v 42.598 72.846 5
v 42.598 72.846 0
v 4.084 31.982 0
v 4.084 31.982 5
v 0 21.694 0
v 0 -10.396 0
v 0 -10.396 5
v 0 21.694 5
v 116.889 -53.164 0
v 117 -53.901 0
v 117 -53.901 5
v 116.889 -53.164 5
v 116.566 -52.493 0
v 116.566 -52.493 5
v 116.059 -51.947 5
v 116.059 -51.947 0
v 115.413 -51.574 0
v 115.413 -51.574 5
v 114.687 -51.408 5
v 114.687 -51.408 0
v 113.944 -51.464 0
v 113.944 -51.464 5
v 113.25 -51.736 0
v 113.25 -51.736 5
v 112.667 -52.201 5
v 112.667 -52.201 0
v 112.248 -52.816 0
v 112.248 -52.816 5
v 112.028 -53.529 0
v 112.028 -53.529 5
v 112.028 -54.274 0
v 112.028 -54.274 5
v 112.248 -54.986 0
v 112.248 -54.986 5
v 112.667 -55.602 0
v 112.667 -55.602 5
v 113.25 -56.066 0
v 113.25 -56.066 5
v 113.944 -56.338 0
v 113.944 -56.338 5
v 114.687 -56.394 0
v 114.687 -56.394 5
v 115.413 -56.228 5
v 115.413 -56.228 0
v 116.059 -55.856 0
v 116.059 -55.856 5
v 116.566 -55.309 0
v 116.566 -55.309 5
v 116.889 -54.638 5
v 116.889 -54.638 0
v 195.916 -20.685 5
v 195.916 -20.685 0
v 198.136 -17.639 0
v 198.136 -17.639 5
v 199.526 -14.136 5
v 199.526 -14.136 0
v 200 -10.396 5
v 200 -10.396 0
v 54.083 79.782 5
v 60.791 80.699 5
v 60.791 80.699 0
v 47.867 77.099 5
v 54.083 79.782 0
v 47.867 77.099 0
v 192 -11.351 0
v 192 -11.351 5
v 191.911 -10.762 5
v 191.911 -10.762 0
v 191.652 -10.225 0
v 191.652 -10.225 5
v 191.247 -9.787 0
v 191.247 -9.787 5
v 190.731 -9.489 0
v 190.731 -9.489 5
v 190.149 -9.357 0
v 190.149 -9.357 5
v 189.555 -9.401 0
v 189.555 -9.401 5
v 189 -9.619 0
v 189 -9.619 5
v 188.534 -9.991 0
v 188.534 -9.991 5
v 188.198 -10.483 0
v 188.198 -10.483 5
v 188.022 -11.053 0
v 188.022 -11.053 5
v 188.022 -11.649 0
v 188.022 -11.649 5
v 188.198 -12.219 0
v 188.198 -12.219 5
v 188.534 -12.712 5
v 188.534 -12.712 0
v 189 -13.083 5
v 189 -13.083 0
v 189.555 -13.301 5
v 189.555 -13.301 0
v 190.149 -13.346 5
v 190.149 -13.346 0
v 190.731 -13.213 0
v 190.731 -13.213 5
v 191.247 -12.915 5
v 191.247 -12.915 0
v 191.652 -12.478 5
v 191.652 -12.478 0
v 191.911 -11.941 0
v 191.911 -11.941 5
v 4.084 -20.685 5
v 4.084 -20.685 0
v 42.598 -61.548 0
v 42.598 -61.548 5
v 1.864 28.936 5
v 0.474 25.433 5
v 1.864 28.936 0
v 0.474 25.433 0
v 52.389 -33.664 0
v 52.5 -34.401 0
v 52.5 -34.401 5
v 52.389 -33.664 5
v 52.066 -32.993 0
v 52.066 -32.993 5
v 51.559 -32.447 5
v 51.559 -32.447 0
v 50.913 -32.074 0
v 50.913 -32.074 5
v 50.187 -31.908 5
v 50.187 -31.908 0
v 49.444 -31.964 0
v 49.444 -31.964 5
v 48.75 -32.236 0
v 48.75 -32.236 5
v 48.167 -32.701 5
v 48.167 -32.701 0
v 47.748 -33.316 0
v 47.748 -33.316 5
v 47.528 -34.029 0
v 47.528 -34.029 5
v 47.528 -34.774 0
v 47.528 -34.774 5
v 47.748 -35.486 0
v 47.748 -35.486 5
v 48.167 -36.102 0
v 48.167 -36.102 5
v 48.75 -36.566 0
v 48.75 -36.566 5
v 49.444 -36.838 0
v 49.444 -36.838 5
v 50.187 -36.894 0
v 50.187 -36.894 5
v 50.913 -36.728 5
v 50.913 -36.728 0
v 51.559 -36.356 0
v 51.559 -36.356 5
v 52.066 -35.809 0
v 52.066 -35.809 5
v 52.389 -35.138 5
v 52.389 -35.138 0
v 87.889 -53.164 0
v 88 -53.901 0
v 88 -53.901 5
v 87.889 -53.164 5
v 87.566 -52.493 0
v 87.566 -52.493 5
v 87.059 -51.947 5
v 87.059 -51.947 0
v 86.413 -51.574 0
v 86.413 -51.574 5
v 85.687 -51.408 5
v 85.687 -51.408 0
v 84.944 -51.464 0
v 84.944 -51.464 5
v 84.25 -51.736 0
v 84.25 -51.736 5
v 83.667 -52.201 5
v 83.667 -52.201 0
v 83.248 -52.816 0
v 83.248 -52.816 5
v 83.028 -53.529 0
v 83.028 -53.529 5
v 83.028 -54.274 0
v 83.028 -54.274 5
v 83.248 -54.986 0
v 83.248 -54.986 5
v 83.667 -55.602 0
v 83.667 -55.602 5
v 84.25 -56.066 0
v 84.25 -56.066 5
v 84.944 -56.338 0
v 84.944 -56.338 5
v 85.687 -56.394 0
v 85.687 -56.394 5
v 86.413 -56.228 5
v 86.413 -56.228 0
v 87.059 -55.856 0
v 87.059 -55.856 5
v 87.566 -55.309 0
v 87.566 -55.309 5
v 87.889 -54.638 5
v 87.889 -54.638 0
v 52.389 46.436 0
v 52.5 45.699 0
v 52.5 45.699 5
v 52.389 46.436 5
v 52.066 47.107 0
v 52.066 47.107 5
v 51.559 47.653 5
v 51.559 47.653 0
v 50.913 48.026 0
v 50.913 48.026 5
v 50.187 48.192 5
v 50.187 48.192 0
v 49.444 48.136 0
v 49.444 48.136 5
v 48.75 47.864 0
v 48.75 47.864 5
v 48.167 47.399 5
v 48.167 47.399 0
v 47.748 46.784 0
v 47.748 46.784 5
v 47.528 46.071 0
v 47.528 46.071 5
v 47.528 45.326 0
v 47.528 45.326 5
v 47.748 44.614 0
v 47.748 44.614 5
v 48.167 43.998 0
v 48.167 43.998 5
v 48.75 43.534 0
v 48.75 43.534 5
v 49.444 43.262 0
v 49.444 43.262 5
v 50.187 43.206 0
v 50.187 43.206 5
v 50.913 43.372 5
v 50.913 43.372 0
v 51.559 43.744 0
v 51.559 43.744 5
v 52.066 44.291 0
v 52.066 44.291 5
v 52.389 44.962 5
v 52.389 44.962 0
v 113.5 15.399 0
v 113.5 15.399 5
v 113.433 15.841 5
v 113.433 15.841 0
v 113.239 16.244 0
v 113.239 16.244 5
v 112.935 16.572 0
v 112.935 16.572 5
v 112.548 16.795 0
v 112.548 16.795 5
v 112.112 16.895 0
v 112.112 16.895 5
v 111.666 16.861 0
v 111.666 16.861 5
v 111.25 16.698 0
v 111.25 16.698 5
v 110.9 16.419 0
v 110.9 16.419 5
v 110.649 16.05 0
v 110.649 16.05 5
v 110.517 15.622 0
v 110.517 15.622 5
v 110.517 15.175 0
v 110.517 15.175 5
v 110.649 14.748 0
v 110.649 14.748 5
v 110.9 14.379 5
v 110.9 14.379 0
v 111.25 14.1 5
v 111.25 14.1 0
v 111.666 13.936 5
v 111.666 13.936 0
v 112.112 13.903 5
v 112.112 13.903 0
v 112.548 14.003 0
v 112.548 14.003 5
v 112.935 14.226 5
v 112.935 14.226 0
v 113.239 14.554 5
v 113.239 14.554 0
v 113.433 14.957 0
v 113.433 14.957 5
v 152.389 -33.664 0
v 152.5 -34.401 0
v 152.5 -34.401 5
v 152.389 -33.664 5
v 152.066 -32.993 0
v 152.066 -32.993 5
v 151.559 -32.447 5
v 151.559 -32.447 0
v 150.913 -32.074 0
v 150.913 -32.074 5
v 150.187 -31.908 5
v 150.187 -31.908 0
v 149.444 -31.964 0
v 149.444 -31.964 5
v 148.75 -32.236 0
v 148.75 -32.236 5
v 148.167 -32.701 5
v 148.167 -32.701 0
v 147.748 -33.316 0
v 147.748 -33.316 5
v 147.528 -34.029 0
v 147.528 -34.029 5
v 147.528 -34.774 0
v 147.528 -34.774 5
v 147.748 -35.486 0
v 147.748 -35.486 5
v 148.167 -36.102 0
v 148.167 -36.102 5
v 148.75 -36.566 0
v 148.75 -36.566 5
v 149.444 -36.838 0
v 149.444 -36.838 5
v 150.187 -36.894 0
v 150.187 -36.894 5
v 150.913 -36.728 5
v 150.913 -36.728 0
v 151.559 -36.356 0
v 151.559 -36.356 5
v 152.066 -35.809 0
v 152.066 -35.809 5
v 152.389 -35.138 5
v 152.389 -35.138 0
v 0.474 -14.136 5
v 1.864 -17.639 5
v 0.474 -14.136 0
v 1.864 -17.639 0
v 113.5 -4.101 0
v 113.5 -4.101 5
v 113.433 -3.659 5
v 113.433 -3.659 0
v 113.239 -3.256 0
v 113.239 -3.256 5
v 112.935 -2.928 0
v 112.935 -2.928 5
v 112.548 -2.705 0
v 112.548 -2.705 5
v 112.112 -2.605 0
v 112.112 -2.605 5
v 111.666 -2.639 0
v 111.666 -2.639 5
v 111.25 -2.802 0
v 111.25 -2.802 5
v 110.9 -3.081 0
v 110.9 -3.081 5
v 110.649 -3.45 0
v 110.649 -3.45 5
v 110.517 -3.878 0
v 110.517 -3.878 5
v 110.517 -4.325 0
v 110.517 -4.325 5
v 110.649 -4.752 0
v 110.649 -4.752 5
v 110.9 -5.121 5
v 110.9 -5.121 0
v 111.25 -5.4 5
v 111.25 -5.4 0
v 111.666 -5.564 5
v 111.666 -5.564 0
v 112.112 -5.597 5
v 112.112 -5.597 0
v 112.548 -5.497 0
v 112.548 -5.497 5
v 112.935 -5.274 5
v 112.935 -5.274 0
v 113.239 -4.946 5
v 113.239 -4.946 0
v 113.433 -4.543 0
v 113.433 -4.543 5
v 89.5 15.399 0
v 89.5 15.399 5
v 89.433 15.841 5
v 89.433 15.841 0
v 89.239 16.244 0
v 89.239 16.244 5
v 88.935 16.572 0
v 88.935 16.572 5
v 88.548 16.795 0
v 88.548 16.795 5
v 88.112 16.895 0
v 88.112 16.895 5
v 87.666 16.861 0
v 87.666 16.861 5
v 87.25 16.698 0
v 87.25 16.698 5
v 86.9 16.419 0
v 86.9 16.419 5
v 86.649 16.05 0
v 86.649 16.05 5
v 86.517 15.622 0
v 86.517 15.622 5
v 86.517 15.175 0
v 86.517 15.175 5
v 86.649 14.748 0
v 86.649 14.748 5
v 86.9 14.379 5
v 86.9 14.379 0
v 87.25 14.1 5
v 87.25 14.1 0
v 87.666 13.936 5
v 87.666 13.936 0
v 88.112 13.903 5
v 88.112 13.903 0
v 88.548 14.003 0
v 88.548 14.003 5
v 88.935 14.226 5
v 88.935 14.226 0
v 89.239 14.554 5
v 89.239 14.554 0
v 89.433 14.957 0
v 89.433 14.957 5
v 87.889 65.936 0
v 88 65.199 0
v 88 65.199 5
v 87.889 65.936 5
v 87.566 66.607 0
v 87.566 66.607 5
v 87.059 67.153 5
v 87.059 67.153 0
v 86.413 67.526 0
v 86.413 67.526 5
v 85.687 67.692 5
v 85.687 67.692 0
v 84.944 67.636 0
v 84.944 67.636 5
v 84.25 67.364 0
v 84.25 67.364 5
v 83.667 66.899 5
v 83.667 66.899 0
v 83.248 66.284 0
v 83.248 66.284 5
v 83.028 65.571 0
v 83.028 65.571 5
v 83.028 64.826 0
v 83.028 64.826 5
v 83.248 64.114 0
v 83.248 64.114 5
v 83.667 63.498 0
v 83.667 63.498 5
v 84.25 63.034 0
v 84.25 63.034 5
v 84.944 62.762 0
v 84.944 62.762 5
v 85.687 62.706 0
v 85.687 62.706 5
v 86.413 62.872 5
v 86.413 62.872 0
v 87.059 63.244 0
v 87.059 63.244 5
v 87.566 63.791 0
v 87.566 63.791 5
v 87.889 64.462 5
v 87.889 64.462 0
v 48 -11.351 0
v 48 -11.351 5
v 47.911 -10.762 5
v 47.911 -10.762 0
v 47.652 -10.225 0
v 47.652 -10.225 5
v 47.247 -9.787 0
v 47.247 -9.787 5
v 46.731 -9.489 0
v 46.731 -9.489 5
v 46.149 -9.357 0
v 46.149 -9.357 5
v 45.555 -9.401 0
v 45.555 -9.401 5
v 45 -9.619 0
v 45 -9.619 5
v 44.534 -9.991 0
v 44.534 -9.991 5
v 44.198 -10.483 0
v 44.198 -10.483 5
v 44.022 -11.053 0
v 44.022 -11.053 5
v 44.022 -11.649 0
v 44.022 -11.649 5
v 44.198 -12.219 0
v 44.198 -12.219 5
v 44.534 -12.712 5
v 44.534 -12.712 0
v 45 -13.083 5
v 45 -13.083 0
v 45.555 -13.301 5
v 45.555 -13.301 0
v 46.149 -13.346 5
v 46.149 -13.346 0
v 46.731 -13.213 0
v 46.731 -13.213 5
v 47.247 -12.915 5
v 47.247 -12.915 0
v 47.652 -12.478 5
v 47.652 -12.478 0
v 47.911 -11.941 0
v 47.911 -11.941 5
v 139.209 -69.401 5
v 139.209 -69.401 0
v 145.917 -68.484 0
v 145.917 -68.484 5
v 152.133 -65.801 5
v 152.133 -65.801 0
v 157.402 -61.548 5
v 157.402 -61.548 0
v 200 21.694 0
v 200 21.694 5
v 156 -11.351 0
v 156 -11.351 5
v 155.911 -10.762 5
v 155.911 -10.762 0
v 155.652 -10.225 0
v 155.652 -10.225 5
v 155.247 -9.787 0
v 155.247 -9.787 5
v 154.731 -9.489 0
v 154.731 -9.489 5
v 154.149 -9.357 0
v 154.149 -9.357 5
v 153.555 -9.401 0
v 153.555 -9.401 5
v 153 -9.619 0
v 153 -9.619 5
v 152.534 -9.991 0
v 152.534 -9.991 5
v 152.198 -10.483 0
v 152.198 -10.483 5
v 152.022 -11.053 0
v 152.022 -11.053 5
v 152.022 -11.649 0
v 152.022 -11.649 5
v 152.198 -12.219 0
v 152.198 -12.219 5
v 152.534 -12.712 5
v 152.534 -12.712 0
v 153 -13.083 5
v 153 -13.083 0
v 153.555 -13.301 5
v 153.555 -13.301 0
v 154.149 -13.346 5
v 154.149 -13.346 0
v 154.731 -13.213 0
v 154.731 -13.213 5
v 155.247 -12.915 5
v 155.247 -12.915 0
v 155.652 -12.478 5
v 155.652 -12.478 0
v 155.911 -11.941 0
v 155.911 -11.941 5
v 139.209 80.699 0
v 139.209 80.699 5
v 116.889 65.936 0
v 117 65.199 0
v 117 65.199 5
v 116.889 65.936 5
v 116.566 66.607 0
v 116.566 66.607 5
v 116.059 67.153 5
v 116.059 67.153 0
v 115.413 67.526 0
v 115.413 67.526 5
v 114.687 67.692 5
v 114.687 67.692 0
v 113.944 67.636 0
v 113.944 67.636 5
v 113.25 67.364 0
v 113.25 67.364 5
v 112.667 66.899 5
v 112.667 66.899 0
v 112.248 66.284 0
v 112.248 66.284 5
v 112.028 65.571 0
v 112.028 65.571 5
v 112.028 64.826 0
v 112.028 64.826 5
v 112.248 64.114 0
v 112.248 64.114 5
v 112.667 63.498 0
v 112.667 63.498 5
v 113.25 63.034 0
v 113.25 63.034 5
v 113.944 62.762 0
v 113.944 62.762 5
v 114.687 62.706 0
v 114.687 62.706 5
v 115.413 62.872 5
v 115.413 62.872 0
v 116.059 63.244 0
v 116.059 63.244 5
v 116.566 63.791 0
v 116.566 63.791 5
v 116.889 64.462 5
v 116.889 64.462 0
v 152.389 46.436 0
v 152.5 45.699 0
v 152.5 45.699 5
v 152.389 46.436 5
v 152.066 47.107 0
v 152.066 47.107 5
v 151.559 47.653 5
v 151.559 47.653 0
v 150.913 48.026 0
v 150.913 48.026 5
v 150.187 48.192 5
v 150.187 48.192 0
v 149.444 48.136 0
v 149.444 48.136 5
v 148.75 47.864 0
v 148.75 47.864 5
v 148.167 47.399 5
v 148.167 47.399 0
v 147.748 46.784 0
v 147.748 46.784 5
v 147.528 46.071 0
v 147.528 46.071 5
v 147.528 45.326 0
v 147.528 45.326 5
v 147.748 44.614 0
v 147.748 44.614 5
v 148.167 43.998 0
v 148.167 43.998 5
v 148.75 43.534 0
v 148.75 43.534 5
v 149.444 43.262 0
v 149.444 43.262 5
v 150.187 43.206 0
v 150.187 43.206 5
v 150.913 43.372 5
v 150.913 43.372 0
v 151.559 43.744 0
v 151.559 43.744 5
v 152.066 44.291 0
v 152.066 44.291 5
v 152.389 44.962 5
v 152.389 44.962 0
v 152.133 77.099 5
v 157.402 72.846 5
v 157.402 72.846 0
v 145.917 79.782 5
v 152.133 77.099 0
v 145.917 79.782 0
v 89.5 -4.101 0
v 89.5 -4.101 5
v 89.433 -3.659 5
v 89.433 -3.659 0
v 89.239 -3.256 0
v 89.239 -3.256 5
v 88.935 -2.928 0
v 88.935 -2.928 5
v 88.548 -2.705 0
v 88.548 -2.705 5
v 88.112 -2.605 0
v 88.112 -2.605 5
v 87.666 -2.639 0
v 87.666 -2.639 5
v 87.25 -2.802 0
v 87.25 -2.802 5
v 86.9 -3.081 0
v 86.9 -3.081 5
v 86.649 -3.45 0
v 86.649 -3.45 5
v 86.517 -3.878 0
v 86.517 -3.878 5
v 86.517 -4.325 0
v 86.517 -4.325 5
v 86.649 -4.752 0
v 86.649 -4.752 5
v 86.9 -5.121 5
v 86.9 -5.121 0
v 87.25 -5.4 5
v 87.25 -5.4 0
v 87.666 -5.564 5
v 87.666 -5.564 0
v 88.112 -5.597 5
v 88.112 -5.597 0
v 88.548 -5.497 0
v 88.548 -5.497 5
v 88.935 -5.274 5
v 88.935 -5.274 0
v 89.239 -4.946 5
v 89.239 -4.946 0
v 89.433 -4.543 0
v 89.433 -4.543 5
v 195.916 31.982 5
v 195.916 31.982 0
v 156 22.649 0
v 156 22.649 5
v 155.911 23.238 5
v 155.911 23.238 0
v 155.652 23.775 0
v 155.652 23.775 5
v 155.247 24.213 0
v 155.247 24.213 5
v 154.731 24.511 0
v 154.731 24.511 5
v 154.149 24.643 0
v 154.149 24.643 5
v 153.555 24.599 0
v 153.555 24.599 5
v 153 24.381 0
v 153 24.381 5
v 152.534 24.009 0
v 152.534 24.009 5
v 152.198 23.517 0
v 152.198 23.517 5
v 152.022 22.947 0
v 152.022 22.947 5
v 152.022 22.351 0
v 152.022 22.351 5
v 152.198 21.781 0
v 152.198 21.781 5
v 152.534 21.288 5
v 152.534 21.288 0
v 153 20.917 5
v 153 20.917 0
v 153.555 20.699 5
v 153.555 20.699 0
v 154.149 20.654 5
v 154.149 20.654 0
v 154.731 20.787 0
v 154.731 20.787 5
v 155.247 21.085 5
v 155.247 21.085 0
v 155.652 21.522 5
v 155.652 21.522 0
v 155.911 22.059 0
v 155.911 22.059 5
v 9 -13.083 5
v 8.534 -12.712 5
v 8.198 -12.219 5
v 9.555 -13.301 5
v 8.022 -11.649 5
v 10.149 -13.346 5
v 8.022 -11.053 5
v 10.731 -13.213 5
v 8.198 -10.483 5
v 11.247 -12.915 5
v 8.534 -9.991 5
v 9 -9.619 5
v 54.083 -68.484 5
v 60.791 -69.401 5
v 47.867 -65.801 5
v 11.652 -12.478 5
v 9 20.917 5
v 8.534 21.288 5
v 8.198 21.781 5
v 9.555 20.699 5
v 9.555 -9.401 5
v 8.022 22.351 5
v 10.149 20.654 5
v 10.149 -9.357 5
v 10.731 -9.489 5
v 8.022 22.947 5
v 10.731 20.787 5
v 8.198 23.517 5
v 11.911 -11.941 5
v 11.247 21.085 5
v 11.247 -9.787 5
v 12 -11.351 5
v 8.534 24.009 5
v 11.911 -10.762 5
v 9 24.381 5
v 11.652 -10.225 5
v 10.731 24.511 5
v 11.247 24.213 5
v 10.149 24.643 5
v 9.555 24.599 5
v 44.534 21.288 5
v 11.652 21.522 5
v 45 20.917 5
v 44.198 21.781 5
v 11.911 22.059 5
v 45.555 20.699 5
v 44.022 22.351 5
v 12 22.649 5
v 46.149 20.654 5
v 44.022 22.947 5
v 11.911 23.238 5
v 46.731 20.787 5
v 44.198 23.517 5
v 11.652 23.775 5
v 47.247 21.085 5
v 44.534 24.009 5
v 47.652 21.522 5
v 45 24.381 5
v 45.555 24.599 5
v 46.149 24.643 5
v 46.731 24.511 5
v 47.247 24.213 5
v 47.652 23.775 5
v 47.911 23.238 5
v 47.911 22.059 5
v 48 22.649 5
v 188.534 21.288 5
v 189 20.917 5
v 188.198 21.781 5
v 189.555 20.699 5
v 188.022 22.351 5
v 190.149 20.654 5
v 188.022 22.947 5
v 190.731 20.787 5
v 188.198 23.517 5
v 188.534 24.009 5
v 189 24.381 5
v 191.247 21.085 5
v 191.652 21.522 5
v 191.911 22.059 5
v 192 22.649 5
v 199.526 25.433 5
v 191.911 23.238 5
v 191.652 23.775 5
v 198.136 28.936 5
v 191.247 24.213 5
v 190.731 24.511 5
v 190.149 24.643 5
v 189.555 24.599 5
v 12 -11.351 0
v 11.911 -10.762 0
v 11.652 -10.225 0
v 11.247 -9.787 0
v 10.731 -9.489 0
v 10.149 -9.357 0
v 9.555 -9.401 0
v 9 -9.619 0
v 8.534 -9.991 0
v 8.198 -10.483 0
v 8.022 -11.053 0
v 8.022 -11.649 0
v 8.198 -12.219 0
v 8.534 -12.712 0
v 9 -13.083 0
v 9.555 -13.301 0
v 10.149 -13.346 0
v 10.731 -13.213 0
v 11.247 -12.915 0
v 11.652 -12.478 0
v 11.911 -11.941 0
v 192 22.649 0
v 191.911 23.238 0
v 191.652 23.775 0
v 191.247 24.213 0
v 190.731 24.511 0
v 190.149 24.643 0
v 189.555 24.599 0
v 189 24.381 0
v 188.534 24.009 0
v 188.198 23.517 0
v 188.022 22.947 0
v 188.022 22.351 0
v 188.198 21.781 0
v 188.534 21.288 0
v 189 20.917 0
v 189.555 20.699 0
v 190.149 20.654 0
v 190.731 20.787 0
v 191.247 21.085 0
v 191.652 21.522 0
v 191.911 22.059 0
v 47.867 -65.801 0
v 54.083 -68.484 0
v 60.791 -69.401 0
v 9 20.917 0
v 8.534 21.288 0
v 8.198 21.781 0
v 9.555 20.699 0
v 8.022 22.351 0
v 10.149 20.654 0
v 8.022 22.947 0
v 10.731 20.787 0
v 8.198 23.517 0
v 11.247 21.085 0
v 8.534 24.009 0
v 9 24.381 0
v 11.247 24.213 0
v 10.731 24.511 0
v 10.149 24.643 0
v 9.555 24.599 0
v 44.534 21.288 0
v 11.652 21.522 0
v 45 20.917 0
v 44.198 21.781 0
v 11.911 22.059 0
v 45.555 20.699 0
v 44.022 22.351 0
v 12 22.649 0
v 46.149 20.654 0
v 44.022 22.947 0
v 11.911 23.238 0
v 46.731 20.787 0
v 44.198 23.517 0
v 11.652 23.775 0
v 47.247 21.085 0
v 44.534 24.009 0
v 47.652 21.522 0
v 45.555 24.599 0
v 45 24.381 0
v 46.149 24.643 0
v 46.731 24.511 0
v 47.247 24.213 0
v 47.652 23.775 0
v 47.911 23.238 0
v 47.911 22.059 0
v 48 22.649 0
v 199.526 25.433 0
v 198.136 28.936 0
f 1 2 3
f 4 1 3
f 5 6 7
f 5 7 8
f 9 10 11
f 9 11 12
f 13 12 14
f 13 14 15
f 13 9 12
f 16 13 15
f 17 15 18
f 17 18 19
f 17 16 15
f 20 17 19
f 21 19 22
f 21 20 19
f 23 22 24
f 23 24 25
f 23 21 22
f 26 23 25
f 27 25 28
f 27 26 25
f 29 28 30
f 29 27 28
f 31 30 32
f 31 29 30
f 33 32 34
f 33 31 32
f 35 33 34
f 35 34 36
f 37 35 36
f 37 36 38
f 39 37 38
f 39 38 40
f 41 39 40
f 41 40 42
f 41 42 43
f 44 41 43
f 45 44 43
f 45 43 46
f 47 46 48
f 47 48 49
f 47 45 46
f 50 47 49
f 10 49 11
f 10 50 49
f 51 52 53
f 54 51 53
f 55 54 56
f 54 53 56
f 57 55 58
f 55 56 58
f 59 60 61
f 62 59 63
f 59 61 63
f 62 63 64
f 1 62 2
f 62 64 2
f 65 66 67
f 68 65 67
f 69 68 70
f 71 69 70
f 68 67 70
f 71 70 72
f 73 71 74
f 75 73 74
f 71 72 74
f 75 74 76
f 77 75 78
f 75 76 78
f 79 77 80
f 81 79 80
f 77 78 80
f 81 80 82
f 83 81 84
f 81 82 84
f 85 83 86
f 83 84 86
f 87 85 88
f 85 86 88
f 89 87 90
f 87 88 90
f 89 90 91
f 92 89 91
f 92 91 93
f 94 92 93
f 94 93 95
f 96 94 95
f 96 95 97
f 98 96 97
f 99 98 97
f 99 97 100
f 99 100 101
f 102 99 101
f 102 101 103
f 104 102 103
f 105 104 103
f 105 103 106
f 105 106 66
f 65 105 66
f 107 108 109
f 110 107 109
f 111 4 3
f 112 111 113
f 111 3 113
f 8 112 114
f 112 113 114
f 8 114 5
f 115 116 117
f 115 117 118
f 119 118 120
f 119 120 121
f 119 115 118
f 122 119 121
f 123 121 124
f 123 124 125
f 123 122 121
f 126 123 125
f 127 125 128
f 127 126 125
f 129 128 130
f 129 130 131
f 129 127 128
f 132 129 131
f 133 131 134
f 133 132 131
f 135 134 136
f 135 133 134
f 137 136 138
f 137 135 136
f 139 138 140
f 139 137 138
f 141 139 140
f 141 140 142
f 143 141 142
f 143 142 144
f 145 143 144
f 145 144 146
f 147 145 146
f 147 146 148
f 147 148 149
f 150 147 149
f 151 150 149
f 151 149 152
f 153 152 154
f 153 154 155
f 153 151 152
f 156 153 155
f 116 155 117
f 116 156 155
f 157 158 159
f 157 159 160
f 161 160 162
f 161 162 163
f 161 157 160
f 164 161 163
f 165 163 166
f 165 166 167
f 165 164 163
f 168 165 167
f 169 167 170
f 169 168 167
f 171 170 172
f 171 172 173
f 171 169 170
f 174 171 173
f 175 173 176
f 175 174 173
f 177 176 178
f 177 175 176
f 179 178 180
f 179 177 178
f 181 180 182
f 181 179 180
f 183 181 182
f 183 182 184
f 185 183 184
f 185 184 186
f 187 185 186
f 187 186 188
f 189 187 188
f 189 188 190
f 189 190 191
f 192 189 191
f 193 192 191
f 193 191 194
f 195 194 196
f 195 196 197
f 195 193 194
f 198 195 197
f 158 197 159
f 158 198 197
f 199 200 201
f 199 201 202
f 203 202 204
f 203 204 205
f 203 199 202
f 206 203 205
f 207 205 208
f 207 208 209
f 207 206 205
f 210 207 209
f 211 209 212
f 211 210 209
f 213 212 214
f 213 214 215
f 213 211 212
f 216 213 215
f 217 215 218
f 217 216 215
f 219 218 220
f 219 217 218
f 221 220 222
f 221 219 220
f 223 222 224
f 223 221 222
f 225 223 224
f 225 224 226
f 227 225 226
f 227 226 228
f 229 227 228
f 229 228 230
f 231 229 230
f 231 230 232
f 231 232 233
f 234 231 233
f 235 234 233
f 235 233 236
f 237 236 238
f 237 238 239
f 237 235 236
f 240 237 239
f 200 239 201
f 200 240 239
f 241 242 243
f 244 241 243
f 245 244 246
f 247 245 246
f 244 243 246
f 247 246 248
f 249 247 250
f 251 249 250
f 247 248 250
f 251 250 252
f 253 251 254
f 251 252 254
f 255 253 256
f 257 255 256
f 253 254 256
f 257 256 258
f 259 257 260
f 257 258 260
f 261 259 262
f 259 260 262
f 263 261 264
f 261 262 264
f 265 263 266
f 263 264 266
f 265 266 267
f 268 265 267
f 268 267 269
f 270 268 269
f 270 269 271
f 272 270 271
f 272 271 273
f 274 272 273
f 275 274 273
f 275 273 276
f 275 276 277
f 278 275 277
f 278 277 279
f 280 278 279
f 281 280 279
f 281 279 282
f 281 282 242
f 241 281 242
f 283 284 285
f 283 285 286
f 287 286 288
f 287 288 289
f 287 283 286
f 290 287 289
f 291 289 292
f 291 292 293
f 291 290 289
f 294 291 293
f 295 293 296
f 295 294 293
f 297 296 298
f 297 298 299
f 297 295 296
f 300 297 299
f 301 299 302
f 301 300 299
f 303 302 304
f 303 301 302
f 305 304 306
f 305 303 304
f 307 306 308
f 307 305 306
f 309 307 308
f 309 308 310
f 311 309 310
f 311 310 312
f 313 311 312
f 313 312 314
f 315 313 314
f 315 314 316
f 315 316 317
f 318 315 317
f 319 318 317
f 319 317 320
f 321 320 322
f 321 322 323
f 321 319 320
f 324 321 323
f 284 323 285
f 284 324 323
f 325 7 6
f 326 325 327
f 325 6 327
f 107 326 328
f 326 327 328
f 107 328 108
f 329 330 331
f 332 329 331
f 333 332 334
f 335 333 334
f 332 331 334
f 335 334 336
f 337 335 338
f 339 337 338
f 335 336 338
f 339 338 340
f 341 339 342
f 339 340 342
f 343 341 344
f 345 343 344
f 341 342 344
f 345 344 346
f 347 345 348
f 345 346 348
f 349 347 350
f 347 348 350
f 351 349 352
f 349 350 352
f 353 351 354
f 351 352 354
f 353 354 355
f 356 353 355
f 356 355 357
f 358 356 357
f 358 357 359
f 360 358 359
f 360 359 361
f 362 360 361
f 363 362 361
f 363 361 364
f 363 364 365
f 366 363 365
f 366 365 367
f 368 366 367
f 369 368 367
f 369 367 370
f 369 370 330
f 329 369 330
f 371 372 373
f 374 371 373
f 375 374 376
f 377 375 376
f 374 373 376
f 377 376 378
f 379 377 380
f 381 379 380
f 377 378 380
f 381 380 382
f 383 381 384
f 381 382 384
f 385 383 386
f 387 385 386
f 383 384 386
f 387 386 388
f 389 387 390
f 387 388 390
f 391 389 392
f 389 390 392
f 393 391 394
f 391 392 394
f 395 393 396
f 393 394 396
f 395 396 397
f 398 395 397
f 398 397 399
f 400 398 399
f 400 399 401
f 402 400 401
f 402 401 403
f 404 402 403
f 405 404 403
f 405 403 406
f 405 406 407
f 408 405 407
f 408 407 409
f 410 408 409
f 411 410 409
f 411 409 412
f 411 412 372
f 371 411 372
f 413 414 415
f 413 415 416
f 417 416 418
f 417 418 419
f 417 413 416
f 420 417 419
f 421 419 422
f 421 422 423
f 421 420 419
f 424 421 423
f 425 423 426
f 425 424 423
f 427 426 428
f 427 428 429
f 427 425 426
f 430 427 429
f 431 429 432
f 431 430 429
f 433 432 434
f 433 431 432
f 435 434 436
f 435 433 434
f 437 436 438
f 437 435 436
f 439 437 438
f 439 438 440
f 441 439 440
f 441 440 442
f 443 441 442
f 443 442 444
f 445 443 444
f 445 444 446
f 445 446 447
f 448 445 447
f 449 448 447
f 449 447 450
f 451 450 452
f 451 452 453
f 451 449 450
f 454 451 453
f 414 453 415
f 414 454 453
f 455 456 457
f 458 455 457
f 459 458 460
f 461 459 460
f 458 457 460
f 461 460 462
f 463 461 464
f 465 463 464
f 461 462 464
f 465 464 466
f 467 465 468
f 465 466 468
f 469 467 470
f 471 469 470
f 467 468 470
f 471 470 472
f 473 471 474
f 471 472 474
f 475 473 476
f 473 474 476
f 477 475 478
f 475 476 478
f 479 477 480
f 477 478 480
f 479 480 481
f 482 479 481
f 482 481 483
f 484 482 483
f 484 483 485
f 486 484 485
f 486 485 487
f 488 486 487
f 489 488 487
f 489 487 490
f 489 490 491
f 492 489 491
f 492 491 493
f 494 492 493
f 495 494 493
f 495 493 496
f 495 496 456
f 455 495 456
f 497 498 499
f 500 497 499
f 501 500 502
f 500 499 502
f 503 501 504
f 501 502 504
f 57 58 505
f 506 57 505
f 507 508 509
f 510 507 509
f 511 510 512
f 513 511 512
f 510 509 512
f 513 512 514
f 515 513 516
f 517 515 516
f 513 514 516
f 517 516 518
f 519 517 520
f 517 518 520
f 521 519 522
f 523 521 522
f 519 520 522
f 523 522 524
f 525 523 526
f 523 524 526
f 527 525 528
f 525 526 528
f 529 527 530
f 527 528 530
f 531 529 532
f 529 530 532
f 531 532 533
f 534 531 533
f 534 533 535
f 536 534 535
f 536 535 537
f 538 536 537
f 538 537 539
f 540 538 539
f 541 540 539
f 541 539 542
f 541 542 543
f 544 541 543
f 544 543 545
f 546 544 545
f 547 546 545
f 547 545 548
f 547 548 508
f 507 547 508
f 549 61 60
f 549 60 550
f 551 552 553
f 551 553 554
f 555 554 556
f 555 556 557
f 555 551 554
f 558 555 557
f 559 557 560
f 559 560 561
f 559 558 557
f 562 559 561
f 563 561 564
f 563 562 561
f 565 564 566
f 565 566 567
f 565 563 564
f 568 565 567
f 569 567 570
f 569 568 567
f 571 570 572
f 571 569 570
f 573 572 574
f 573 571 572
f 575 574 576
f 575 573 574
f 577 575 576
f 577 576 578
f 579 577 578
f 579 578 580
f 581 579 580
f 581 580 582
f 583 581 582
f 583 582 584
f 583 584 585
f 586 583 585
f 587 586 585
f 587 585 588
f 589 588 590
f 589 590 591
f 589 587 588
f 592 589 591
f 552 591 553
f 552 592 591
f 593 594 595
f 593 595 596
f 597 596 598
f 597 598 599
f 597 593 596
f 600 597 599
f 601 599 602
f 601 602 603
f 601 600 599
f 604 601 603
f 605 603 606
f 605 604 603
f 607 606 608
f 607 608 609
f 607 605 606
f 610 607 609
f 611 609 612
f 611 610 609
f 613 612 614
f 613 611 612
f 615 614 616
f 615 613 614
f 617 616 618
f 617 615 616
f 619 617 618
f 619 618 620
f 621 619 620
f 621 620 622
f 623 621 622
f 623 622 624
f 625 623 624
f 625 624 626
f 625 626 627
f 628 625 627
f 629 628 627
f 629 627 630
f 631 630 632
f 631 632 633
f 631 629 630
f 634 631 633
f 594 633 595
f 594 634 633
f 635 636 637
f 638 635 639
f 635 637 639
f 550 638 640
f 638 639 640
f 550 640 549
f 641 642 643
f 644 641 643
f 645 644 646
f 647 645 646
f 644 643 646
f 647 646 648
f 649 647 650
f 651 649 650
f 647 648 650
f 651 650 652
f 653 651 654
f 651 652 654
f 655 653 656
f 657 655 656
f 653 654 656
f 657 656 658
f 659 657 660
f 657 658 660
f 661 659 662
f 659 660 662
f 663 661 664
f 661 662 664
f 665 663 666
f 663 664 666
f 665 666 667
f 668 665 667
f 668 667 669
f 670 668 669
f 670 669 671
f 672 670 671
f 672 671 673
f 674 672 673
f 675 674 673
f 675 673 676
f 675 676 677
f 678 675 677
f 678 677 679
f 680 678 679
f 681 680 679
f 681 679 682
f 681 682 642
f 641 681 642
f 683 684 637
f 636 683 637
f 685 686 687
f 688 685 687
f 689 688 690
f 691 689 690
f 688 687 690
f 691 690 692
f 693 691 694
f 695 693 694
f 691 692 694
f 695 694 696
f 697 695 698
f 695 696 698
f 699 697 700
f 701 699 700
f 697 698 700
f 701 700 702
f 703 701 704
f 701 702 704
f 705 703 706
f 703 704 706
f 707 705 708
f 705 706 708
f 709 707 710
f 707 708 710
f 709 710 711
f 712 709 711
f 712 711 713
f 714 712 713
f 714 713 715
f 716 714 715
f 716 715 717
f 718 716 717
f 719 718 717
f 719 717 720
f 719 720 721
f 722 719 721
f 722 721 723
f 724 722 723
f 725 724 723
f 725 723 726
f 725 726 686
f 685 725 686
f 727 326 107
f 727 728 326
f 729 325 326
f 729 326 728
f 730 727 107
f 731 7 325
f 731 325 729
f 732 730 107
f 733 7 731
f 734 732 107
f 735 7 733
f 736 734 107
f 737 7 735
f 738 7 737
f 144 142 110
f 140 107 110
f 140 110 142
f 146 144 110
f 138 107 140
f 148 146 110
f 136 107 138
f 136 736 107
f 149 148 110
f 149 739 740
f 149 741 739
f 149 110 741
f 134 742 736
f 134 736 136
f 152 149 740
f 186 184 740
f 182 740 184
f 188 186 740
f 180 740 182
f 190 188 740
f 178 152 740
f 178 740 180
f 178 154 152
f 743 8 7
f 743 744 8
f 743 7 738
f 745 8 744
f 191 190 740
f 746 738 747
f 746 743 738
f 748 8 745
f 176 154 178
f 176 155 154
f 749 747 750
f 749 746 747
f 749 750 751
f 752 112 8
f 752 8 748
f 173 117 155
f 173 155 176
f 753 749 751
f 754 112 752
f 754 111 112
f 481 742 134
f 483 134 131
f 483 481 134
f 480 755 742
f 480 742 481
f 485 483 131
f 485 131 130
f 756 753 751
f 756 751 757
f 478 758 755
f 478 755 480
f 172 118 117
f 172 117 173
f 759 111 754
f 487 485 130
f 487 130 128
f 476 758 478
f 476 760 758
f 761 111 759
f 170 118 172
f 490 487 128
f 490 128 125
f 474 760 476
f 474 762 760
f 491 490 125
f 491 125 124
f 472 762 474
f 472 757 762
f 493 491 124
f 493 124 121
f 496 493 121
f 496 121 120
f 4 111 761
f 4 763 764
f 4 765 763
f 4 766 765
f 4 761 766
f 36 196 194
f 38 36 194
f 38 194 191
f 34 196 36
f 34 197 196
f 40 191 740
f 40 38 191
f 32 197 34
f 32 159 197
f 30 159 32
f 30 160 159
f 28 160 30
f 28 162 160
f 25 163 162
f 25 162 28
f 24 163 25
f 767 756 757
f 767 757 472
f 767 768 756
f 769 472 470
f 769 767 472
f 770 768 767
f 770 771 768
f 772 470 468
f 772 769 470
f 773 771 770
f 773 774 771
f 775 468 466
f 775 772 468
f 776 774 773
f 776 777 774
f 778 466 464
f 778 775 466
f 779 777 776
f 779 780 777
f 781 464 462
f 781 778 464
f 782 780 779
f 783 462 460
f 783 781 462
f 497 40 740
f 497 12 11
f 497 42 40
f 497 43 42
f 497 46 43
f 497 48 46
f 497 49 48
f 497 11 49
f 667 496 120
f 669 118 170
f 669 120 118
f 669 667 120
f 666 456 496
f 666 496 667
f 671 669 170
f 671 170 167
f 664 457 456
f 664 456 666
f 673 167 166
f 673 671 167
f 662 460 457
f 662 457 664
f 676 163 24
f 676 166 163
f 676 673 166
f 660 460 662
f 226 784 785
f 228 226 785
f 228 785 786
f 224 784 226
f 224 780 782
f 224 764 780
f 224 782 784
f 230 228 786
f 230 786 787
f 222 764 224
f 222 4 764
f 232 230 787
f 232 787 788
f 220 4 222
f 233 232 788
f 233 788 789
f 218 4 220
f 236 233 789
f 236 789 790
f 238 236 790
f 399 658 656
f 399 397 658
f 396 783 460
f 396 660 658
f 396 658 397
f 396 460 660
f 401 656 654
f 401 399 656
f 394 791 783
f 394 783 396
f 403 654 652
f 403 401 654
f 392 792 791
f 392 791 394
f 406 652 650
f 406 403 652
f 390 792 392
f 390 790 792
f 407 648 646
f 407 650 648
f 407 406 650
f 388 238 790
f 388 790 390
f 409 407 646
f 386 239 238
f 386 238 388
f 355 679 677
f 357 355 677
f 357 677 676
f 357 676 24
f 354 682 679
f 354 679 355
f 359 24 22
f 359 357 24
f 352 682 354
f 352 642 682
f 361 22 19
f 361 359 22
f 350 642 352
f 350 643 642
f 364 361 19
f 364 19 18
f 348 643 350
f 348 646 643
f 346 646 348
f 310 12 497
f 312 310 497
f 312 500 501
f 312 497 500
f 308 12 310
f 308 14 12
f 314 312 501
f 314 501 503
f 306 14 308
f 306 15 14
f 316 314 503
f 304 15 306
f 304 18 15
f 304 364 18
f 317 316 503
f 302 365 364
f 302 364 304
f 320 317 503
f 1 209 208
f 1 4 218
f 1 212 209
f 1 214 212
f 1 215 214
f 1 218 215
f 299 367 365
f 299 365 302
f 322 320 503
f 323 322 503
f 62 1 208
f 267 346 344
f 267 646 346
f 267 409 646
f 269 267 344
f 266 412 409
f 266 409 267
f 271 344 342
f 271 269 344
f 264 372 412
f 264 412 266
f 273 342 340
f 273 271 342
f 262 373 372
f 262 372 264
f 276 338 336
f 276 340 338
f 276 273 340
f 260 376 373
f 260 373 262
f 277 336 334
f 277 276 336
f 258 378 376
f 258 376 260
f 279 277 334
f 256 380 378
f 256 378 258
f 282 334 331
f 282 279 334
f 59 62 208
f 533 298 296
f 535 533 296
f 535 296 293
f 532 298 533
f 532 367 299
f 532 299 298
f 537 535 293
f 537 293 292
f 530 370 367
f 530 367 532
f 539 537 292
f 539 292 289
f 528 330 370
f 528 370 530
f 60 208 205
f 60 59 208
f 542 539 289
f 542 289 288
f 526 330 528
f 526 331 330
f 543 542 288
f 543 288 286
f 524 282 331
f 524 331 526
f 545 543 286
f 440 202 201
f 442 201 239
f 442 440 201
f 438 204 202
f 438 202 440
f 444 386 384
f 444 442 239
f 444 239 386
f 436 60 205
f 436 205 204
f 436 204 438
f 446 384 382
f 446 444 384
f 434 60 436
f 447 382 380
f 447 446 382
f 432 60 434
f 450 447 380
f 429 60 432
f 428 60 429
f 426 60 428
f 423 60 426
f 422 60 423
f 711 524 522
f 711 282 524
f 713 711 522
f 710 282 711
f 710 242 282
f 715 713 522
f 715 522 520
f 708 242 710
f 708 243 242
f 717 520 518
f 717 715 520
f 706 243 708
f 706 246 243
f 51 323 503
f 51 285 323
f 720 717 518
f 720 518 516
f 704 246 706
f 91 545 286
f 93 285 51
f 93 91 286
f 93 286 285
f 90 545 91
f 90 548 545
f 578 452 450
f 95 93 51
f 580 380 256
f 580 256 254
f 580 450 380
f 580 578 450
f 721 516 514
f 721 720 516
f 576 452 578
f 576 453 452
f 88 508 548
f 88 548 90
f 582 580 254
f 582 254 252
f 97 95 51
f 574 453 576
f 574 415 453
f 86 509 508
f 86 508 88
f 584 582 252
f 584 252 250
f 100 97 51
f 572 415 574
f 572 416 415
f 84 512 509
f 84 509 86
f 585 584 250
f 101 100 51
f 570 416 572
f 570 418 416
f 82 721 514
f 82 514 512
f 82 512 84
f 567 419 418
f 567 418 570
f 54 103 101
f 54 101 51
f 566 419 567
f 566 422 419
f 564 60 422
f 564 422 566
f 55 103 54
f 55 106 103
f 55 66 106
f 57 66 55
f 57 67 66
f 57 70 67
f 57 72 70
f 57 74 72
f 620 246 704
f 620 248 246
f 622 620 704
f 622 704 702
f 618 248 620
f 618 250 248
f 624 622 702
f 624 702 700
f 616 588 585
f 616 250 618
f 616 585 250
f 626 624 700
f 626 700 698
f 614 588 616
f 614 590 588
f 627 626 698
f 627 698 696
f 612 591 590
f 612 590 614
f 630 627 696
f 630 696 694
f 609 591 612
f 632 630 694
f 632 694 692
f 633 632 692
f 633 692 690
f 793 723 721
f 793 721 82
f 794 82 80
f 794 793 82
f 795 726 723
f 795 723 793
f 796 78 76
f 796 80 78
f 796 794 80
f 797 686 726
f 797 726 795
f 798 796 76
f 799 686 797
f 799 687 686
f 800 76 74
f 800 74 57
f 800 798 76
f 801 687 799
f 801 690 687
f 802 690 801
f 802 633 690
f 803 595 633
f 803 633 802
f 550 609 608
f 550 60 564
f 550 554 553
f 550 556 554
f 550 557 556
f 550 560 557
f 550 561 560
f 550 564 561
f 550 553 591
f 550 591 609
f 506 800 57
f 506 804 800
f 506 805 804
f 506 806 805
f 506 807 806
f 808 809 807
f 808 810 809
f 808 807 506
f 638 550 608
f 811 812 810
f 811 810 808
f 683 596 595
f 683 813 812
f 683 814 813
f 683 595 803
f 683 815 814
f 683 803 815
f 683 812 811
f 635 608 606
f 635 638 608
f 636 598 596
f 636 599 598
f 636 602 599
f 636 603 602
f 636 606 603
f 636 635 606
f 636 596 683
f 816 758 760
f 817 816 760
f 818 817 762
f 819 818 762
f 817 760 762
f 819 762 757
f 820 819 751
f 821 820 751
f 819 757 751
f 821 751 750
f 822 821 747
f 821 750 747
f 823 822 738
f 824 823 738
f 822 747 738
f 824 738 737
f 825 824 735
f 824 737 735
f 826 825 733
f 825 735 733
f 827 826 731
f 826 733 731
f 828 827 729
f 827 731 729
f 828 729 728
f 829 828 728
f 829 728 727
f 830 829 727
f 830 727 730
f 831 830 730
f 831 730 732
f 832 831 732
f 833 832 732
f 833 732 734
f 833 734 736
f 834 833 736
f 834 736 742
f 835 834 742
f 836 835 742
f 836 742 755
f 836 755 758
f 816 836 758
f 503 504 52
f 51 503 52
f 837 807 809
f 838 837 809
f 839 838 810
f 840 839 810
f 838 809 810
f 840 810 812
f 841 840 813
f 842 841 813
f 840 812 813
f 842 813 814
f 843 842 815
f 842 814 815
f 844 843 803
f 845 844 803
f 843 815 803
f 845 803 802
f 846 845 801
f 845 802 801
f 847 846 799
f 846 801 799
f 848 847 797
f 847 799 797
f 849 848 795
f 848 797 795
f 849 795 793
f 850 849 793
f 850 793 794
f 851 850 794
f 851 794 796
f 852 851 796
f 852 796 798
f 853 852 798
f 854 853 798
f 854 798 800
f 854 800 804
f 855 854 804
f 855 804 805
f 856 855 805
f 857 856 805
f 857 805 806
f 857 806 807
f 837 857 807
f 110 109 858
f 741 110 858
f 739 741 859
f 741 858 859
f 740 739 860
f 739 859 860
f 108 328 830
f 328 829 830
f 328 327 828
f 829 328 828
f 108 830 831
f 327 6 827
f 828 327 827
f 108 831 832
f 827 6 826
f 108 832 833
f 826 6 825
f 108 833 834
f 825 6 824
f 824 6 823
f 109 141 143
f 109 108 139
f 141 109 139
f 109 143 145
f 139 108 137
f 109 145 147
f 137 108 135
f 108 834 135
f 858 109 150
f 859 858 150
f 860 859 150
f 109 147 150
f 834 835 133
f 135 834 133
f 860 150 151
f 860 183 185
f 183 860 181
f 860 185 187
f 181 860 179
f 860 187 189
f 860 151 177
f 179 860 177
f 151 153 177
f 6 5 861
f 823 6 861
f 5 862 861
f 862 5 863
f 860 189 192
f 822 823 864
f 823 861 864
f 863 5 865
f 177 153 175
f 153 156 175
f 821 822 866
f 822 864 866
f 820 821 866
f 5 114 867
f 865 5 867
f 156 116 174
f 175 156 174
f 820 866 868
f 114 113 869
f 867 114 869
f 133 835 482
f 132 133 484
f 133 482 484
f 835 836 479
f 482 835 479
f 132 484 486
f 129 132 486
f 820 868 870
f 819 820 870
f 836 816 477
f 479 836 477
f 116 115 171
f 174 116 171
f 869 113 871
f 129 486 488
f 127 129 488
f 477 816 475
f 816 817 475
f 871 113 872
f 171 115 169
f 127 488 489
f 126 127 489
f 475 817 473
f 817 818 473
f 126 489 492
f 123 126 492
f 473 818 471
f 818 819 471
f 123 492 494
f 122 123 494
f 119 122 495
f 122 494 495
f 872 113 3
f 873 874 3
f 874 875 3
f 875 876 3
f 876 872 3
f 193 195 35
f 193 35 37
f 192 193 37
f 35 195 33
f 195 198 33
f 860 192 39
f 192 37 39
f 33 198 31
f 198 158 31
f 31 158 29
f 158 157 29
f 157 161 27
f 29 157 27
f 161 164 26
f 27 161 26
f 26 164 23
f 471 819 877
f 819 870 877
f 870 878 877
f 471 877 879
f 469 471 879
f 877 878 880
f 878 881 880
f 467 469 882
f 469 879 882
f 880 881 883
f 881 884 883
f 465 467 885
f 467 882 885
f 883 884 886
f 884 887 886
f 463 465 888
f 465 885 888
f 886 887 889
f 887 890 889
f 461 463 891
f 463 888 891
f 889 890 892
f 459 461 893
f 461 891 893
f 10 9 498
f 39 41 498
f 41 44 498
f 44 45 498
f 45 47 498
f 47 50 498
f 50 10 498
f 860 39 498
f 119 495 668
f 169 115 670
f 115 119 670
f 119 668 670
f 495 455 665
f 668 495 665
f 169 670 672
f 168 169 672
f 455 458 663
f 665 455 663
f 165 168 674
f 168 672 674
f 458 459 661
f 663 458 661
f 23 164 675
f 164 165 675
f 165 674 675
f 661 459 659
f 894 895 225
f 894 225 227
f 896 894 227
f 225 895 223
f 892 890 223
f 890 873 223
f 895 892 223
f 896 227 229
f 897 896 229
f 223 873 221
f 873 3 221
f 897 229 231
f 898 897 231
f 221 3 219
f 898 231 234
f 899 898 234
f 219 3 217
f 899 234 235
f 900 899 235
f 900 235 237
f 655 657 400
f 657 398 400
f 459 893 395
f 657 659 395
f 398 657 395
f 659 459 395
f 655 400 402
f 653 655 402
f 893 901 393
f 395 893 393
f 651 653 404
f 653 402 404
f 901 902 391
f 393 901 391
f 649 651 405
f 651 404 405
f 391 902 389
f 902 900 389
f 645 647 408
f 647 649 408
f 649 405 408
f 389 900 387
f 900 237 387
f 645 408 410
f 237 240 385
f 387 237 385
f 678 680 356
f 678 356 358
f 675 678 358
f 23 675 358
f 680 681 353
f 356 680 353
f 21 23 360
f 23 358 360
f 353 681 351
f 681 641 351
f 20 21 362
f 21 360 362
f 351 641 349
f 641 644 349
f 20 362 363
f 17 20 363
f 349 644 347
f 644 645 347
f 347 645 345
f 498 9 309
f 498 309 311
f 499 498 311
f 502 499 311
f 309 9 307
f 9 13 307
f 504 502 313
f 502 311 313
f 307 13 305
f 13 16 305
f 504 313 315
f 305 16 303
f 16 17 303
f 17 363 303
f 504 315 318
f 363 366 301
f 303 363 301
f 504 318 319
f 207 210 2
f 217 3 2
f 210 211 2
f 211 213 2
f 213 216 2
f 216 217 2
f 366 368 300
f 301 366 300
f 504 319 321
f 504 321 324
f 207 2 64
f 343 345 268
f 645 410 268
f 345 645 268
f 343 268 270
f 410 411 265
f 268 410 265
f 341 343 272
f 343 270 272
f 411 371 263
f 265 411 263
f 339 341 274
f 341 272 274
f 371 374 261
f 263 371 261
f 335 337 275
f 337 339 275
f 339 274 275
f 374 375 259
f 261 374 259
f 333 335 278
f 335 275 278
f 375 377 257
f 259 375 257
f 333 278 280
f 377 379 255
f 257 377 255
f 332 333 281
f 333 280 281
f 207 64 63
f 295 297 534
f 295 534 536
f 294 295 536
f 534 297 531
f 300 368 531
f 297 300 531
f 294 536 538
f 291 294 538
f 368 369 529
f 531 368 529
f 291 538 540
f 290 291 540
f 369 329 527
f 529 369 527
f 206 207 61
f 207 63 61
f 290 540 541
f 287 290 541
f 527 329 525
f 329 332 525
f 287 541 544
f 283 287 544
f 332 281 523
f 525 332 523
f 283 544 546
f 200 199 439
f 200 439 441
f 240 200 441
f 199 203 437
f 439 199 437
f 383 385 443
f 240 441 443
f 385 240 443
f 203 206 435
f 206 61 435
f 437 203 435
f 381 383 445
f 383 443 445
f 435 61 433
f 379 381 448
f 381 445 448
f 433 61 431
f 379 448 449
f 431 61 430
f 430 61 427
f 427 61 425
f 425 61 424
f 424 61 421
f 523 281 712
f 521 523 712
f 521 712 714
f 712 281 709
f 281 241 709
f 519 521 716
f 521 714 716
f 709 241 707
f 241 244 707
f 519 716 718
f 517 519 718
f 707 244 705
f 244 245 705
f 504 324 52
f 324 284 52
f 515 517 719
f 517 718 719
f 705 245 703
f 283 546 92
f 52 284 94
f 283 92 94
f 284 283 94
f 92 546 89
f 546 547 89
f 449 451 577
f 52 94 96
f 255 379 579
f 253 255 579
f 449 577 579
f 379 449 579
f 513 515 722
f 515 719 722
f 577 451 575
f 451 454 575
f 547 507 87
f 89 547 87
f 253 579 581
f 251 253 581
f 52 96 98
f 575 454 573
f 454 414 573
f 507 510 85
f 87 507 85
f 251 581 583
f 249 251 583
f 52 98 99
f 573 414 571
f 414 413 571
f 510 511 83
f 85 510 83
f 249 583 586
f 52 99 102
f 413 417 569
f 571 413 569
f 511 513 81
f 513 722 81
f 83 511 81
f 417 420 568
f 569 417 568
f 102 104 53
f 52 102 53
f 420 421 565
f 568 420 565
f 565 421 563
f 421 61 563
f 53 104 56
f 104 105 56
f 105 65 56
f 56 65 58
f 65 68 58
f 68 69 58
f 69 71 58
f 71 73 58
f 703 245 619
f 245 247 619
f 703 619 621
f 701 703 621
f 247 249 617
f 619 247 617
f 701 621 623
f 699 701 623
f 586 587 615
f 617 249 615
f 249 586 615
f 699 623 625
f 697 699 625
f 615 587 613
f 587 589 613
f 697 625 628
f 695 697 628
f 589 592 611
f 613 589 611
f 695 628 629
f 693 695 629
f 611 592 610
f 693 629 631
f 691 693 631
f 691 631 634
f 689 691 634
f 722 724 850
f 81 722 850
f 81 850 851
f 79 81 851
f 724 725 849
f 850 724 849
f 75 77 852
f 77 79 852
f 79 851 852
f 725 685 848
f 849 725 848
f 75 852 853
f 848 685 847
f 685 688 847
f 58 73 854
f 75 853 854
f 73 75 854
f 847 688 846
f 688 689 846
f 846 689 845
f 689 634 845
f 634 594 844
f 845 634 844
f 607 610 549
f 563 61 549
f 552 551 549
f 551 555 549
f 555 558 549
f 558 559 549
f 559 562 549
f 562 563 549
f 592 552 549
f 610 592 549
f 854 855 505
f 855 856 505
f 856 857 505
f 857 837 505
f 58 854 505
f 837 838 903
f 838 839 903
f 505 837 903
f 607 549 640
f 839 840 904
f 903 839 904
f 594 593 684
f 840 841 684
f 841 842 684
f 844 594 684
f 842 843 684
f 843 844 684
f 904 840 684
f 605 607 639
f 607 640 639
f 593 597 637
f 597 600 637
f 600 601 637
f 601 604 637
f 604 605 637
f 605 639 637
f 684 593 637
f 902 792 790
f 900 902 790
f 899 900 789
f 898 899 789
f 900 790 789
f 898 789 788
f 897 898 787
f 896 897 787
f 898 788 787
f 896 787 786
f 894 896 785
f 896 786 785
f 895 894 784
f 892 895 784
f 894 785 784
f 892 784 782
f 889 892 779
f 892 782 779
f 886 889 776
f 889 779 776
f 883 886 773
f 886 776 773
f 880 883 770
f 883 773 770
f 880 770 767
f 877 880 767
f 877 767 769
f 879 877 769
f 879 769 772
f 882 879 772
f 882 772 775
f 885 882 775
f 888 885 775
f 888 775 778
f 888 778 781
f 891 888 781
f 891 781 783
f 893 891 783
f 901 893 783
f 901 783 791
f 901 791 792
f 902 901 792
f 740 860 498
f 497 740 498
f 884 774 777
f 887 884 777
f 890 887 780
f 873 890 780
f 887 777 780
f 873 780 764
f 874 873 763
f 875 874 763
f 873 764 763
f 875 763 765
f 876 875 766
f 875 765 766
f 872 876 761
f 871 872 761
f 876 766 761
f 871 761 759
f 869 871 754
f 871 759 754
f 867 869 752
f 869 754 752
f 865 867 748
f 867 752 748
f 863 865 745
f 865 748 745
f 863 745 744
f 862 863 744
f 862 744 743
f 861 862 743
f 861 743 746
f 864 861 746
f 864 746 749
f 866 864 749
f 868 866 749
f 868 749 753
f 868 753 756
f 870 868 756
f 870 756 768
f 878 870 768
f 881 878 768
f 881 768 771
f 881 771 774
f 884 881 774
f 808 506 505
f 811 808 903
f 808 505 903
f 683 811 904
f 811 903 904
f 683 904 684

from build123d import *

# Parameters (mm, degrees)
CROQUIS1_W              = 200
CROQUIS1_H              = 150.1
CROQUIS1_R              = 2.5
SALIENTE_EXTRUIR1_DEPTH = 5
CROQUIS2_R              = 1.5
CROQUIS2_R_2            = 2
CORTAR_EXTRUIR1_DEPTH   = 10
CORTAR_EXTRUIR2_DEPTH   = 400


with BuildPart() as part:
    # Croquis1 → Saliente-Extruir1 (new body)
    with BuildSketch(Plane.XY):
        with Locations((100, 5.648844896)):
            Rectangle(CROQUIS1_W, CROQUIS1_H)
        with Locations((85.5, 65.198844896)):
            Circle(CROQUIS1_R, mode=Mode.SUBTRACT)
        with Locations((114.5, 65.198844896)):
            Circle(CROQUIS1_R, mode=Mode.SUBTRACT)
        with Locations((50, 45.698844896)):
            Circle(CROQUIS1_R, mode=Mode.SUBTRACT)
        with Locations((150, 45.698844896)):
            Circle(CROQUIS1_R, mode=Mode.SUBTRACT)
        with Locations((150, -34.401155104)):
            Circle(CROQUIS1_R, mode=Mode.SUBTRACT)
        with Locations((114.5, -53.901155104)):
            Circle(CROQUIS1_R, mode=Mode.SUBTRACT)
        with Locations((85.5, -53.901155104)):
            Circle(CROQUIS1_R, mode=Mode.SUBTRACT)
        with Locations((50, -34.401155104)):
            Circle(CROQUIS1_R, mode=Mode.SUBTRACT)
    extrude(amount=SALIENTE_EXTRUIR1_DEPTH)

    # Croquis2 → Cortar-Extruir1 (cut)
    with BuildSketch(Plane.XY.offset(5)):
        with Locations((88, 15.398844896)):
            Circle(CROQUIS2_R)
        with Locations((112, 15.398844896)):
            Circle(CROQUIS2_R)
        with Locations((88, -4.101155104)):
            Circle(CROQUIS2_R)
        with Locations((112, -4.101155104)):
            Circle(CROQUIS2_R)
        with Locations((10, 22.648844896)):
            Circle(CROQUIS2_R_2)
        with Locations((46, 22.648844896)):
            Circle(CROQUIS2_R_2)
        with Locations((46, -11.351155104)):
            Circle(CROQUIS2_R_2)
        with Locations((10, -11.351155104)):
            Circle(CROQUIS2_R_2)
        with Locations((190, -11.351155104)):
            Circle(CROQUIS2_R_2)
        with Locations((154, -11.351155104)):
            Circle(CROQUIS2_R_2)
        with Locations((154, 22.648844896)):
            Circle(CROQUIS2_R_2)
        with Locations((190, 22.648844896)):
            Circle(CROQUIS2_R_2)
    extrude(amount=-CORTAR_EXTRUIR1_DEPTH, mode=Mode.SUBTRACT)

    # Croquis3 → Cortar-Extruir2 (cut)
    with BuildSketch(Plane(origin=(0, 0, 0), x_dir=(-1, 0, 0), z_dir=(0, 0, -1))):
        with BuildLine():
            Line((-195.915748263, 31.98223599), (-157.401555296, 72.845794728))
            ThreePointArc((-157.401555296, 72.845794728), (-149.116372199, 78.651772224), (-139.208641525, 80.698844896))
            Line((-139.208641525, 80.698844896), (-200, 80.698844896))
            Line((-200, 80.698844896), (-200, 21.694066091))
            ThreePointArc((-200, 21.694066091), (-198.941596464, 27.2286743), (-195.915748263, 31.98223599))
        make_face()
        with BuildLine():
            Line((0, 80.698844896), (-60.791358475, 80.698844896))
            ThreePointArc((-60.791358475, 80.698844896), (-50.883627801, 78.651772224), (-42.598444704, 72.845794728))
            Line((-42.598444704, 72.845794728), (-4.084251737, 31.98223599))
            ThreePointArc((-4.084251737, 31.98223599), (-1.058403536, 27.2286743), (0, 21.694066091))
            Line((0, 21.694066091), (0, 80.698844896))
        make_face()
        with BuildLine():
            Line((0, -69.401155104), (0, -10.396376298))
            ThreePointArc((0, -10.396376298), (-1.058403536, -15.930984508), (-4.084251737, -20.684546197))
            Line((-4.084251737, -20.684546197), (-42.598444704, -61.548104935))
            ThreePointArc((-42.598444704, -61.548104935), (-50.883627801, -67.354082431), (-60.791358475, -69.401155104))
            Line((-60.791358475, -69.401155104), (0, -69.401155104))
        make_face()
        with BuildLine():
            ThreePointArc((-195.915748263, -20.684546197), (-198.941596464, -15.930984508), (-200, -10.396376298))
            Line((-200, -10.396376298), (-200, -69.401155104))
            Line((-200, -69.401155104), (-139.208641525, -69.401155104))
            ThreePointArc((-139.208641525, -69.401155104), (-149.116372199, -67.354082431), (-157.401555296, -61.548104935))
            Line((-157.401555296, -61.548104935), (-195.915748263, -20.684546197))
        make_face()
    extrude(amount=-CORTAR_EXTRUIR2_DEPTH, mode=Mode.SUBTRACT)


solid = part.part
